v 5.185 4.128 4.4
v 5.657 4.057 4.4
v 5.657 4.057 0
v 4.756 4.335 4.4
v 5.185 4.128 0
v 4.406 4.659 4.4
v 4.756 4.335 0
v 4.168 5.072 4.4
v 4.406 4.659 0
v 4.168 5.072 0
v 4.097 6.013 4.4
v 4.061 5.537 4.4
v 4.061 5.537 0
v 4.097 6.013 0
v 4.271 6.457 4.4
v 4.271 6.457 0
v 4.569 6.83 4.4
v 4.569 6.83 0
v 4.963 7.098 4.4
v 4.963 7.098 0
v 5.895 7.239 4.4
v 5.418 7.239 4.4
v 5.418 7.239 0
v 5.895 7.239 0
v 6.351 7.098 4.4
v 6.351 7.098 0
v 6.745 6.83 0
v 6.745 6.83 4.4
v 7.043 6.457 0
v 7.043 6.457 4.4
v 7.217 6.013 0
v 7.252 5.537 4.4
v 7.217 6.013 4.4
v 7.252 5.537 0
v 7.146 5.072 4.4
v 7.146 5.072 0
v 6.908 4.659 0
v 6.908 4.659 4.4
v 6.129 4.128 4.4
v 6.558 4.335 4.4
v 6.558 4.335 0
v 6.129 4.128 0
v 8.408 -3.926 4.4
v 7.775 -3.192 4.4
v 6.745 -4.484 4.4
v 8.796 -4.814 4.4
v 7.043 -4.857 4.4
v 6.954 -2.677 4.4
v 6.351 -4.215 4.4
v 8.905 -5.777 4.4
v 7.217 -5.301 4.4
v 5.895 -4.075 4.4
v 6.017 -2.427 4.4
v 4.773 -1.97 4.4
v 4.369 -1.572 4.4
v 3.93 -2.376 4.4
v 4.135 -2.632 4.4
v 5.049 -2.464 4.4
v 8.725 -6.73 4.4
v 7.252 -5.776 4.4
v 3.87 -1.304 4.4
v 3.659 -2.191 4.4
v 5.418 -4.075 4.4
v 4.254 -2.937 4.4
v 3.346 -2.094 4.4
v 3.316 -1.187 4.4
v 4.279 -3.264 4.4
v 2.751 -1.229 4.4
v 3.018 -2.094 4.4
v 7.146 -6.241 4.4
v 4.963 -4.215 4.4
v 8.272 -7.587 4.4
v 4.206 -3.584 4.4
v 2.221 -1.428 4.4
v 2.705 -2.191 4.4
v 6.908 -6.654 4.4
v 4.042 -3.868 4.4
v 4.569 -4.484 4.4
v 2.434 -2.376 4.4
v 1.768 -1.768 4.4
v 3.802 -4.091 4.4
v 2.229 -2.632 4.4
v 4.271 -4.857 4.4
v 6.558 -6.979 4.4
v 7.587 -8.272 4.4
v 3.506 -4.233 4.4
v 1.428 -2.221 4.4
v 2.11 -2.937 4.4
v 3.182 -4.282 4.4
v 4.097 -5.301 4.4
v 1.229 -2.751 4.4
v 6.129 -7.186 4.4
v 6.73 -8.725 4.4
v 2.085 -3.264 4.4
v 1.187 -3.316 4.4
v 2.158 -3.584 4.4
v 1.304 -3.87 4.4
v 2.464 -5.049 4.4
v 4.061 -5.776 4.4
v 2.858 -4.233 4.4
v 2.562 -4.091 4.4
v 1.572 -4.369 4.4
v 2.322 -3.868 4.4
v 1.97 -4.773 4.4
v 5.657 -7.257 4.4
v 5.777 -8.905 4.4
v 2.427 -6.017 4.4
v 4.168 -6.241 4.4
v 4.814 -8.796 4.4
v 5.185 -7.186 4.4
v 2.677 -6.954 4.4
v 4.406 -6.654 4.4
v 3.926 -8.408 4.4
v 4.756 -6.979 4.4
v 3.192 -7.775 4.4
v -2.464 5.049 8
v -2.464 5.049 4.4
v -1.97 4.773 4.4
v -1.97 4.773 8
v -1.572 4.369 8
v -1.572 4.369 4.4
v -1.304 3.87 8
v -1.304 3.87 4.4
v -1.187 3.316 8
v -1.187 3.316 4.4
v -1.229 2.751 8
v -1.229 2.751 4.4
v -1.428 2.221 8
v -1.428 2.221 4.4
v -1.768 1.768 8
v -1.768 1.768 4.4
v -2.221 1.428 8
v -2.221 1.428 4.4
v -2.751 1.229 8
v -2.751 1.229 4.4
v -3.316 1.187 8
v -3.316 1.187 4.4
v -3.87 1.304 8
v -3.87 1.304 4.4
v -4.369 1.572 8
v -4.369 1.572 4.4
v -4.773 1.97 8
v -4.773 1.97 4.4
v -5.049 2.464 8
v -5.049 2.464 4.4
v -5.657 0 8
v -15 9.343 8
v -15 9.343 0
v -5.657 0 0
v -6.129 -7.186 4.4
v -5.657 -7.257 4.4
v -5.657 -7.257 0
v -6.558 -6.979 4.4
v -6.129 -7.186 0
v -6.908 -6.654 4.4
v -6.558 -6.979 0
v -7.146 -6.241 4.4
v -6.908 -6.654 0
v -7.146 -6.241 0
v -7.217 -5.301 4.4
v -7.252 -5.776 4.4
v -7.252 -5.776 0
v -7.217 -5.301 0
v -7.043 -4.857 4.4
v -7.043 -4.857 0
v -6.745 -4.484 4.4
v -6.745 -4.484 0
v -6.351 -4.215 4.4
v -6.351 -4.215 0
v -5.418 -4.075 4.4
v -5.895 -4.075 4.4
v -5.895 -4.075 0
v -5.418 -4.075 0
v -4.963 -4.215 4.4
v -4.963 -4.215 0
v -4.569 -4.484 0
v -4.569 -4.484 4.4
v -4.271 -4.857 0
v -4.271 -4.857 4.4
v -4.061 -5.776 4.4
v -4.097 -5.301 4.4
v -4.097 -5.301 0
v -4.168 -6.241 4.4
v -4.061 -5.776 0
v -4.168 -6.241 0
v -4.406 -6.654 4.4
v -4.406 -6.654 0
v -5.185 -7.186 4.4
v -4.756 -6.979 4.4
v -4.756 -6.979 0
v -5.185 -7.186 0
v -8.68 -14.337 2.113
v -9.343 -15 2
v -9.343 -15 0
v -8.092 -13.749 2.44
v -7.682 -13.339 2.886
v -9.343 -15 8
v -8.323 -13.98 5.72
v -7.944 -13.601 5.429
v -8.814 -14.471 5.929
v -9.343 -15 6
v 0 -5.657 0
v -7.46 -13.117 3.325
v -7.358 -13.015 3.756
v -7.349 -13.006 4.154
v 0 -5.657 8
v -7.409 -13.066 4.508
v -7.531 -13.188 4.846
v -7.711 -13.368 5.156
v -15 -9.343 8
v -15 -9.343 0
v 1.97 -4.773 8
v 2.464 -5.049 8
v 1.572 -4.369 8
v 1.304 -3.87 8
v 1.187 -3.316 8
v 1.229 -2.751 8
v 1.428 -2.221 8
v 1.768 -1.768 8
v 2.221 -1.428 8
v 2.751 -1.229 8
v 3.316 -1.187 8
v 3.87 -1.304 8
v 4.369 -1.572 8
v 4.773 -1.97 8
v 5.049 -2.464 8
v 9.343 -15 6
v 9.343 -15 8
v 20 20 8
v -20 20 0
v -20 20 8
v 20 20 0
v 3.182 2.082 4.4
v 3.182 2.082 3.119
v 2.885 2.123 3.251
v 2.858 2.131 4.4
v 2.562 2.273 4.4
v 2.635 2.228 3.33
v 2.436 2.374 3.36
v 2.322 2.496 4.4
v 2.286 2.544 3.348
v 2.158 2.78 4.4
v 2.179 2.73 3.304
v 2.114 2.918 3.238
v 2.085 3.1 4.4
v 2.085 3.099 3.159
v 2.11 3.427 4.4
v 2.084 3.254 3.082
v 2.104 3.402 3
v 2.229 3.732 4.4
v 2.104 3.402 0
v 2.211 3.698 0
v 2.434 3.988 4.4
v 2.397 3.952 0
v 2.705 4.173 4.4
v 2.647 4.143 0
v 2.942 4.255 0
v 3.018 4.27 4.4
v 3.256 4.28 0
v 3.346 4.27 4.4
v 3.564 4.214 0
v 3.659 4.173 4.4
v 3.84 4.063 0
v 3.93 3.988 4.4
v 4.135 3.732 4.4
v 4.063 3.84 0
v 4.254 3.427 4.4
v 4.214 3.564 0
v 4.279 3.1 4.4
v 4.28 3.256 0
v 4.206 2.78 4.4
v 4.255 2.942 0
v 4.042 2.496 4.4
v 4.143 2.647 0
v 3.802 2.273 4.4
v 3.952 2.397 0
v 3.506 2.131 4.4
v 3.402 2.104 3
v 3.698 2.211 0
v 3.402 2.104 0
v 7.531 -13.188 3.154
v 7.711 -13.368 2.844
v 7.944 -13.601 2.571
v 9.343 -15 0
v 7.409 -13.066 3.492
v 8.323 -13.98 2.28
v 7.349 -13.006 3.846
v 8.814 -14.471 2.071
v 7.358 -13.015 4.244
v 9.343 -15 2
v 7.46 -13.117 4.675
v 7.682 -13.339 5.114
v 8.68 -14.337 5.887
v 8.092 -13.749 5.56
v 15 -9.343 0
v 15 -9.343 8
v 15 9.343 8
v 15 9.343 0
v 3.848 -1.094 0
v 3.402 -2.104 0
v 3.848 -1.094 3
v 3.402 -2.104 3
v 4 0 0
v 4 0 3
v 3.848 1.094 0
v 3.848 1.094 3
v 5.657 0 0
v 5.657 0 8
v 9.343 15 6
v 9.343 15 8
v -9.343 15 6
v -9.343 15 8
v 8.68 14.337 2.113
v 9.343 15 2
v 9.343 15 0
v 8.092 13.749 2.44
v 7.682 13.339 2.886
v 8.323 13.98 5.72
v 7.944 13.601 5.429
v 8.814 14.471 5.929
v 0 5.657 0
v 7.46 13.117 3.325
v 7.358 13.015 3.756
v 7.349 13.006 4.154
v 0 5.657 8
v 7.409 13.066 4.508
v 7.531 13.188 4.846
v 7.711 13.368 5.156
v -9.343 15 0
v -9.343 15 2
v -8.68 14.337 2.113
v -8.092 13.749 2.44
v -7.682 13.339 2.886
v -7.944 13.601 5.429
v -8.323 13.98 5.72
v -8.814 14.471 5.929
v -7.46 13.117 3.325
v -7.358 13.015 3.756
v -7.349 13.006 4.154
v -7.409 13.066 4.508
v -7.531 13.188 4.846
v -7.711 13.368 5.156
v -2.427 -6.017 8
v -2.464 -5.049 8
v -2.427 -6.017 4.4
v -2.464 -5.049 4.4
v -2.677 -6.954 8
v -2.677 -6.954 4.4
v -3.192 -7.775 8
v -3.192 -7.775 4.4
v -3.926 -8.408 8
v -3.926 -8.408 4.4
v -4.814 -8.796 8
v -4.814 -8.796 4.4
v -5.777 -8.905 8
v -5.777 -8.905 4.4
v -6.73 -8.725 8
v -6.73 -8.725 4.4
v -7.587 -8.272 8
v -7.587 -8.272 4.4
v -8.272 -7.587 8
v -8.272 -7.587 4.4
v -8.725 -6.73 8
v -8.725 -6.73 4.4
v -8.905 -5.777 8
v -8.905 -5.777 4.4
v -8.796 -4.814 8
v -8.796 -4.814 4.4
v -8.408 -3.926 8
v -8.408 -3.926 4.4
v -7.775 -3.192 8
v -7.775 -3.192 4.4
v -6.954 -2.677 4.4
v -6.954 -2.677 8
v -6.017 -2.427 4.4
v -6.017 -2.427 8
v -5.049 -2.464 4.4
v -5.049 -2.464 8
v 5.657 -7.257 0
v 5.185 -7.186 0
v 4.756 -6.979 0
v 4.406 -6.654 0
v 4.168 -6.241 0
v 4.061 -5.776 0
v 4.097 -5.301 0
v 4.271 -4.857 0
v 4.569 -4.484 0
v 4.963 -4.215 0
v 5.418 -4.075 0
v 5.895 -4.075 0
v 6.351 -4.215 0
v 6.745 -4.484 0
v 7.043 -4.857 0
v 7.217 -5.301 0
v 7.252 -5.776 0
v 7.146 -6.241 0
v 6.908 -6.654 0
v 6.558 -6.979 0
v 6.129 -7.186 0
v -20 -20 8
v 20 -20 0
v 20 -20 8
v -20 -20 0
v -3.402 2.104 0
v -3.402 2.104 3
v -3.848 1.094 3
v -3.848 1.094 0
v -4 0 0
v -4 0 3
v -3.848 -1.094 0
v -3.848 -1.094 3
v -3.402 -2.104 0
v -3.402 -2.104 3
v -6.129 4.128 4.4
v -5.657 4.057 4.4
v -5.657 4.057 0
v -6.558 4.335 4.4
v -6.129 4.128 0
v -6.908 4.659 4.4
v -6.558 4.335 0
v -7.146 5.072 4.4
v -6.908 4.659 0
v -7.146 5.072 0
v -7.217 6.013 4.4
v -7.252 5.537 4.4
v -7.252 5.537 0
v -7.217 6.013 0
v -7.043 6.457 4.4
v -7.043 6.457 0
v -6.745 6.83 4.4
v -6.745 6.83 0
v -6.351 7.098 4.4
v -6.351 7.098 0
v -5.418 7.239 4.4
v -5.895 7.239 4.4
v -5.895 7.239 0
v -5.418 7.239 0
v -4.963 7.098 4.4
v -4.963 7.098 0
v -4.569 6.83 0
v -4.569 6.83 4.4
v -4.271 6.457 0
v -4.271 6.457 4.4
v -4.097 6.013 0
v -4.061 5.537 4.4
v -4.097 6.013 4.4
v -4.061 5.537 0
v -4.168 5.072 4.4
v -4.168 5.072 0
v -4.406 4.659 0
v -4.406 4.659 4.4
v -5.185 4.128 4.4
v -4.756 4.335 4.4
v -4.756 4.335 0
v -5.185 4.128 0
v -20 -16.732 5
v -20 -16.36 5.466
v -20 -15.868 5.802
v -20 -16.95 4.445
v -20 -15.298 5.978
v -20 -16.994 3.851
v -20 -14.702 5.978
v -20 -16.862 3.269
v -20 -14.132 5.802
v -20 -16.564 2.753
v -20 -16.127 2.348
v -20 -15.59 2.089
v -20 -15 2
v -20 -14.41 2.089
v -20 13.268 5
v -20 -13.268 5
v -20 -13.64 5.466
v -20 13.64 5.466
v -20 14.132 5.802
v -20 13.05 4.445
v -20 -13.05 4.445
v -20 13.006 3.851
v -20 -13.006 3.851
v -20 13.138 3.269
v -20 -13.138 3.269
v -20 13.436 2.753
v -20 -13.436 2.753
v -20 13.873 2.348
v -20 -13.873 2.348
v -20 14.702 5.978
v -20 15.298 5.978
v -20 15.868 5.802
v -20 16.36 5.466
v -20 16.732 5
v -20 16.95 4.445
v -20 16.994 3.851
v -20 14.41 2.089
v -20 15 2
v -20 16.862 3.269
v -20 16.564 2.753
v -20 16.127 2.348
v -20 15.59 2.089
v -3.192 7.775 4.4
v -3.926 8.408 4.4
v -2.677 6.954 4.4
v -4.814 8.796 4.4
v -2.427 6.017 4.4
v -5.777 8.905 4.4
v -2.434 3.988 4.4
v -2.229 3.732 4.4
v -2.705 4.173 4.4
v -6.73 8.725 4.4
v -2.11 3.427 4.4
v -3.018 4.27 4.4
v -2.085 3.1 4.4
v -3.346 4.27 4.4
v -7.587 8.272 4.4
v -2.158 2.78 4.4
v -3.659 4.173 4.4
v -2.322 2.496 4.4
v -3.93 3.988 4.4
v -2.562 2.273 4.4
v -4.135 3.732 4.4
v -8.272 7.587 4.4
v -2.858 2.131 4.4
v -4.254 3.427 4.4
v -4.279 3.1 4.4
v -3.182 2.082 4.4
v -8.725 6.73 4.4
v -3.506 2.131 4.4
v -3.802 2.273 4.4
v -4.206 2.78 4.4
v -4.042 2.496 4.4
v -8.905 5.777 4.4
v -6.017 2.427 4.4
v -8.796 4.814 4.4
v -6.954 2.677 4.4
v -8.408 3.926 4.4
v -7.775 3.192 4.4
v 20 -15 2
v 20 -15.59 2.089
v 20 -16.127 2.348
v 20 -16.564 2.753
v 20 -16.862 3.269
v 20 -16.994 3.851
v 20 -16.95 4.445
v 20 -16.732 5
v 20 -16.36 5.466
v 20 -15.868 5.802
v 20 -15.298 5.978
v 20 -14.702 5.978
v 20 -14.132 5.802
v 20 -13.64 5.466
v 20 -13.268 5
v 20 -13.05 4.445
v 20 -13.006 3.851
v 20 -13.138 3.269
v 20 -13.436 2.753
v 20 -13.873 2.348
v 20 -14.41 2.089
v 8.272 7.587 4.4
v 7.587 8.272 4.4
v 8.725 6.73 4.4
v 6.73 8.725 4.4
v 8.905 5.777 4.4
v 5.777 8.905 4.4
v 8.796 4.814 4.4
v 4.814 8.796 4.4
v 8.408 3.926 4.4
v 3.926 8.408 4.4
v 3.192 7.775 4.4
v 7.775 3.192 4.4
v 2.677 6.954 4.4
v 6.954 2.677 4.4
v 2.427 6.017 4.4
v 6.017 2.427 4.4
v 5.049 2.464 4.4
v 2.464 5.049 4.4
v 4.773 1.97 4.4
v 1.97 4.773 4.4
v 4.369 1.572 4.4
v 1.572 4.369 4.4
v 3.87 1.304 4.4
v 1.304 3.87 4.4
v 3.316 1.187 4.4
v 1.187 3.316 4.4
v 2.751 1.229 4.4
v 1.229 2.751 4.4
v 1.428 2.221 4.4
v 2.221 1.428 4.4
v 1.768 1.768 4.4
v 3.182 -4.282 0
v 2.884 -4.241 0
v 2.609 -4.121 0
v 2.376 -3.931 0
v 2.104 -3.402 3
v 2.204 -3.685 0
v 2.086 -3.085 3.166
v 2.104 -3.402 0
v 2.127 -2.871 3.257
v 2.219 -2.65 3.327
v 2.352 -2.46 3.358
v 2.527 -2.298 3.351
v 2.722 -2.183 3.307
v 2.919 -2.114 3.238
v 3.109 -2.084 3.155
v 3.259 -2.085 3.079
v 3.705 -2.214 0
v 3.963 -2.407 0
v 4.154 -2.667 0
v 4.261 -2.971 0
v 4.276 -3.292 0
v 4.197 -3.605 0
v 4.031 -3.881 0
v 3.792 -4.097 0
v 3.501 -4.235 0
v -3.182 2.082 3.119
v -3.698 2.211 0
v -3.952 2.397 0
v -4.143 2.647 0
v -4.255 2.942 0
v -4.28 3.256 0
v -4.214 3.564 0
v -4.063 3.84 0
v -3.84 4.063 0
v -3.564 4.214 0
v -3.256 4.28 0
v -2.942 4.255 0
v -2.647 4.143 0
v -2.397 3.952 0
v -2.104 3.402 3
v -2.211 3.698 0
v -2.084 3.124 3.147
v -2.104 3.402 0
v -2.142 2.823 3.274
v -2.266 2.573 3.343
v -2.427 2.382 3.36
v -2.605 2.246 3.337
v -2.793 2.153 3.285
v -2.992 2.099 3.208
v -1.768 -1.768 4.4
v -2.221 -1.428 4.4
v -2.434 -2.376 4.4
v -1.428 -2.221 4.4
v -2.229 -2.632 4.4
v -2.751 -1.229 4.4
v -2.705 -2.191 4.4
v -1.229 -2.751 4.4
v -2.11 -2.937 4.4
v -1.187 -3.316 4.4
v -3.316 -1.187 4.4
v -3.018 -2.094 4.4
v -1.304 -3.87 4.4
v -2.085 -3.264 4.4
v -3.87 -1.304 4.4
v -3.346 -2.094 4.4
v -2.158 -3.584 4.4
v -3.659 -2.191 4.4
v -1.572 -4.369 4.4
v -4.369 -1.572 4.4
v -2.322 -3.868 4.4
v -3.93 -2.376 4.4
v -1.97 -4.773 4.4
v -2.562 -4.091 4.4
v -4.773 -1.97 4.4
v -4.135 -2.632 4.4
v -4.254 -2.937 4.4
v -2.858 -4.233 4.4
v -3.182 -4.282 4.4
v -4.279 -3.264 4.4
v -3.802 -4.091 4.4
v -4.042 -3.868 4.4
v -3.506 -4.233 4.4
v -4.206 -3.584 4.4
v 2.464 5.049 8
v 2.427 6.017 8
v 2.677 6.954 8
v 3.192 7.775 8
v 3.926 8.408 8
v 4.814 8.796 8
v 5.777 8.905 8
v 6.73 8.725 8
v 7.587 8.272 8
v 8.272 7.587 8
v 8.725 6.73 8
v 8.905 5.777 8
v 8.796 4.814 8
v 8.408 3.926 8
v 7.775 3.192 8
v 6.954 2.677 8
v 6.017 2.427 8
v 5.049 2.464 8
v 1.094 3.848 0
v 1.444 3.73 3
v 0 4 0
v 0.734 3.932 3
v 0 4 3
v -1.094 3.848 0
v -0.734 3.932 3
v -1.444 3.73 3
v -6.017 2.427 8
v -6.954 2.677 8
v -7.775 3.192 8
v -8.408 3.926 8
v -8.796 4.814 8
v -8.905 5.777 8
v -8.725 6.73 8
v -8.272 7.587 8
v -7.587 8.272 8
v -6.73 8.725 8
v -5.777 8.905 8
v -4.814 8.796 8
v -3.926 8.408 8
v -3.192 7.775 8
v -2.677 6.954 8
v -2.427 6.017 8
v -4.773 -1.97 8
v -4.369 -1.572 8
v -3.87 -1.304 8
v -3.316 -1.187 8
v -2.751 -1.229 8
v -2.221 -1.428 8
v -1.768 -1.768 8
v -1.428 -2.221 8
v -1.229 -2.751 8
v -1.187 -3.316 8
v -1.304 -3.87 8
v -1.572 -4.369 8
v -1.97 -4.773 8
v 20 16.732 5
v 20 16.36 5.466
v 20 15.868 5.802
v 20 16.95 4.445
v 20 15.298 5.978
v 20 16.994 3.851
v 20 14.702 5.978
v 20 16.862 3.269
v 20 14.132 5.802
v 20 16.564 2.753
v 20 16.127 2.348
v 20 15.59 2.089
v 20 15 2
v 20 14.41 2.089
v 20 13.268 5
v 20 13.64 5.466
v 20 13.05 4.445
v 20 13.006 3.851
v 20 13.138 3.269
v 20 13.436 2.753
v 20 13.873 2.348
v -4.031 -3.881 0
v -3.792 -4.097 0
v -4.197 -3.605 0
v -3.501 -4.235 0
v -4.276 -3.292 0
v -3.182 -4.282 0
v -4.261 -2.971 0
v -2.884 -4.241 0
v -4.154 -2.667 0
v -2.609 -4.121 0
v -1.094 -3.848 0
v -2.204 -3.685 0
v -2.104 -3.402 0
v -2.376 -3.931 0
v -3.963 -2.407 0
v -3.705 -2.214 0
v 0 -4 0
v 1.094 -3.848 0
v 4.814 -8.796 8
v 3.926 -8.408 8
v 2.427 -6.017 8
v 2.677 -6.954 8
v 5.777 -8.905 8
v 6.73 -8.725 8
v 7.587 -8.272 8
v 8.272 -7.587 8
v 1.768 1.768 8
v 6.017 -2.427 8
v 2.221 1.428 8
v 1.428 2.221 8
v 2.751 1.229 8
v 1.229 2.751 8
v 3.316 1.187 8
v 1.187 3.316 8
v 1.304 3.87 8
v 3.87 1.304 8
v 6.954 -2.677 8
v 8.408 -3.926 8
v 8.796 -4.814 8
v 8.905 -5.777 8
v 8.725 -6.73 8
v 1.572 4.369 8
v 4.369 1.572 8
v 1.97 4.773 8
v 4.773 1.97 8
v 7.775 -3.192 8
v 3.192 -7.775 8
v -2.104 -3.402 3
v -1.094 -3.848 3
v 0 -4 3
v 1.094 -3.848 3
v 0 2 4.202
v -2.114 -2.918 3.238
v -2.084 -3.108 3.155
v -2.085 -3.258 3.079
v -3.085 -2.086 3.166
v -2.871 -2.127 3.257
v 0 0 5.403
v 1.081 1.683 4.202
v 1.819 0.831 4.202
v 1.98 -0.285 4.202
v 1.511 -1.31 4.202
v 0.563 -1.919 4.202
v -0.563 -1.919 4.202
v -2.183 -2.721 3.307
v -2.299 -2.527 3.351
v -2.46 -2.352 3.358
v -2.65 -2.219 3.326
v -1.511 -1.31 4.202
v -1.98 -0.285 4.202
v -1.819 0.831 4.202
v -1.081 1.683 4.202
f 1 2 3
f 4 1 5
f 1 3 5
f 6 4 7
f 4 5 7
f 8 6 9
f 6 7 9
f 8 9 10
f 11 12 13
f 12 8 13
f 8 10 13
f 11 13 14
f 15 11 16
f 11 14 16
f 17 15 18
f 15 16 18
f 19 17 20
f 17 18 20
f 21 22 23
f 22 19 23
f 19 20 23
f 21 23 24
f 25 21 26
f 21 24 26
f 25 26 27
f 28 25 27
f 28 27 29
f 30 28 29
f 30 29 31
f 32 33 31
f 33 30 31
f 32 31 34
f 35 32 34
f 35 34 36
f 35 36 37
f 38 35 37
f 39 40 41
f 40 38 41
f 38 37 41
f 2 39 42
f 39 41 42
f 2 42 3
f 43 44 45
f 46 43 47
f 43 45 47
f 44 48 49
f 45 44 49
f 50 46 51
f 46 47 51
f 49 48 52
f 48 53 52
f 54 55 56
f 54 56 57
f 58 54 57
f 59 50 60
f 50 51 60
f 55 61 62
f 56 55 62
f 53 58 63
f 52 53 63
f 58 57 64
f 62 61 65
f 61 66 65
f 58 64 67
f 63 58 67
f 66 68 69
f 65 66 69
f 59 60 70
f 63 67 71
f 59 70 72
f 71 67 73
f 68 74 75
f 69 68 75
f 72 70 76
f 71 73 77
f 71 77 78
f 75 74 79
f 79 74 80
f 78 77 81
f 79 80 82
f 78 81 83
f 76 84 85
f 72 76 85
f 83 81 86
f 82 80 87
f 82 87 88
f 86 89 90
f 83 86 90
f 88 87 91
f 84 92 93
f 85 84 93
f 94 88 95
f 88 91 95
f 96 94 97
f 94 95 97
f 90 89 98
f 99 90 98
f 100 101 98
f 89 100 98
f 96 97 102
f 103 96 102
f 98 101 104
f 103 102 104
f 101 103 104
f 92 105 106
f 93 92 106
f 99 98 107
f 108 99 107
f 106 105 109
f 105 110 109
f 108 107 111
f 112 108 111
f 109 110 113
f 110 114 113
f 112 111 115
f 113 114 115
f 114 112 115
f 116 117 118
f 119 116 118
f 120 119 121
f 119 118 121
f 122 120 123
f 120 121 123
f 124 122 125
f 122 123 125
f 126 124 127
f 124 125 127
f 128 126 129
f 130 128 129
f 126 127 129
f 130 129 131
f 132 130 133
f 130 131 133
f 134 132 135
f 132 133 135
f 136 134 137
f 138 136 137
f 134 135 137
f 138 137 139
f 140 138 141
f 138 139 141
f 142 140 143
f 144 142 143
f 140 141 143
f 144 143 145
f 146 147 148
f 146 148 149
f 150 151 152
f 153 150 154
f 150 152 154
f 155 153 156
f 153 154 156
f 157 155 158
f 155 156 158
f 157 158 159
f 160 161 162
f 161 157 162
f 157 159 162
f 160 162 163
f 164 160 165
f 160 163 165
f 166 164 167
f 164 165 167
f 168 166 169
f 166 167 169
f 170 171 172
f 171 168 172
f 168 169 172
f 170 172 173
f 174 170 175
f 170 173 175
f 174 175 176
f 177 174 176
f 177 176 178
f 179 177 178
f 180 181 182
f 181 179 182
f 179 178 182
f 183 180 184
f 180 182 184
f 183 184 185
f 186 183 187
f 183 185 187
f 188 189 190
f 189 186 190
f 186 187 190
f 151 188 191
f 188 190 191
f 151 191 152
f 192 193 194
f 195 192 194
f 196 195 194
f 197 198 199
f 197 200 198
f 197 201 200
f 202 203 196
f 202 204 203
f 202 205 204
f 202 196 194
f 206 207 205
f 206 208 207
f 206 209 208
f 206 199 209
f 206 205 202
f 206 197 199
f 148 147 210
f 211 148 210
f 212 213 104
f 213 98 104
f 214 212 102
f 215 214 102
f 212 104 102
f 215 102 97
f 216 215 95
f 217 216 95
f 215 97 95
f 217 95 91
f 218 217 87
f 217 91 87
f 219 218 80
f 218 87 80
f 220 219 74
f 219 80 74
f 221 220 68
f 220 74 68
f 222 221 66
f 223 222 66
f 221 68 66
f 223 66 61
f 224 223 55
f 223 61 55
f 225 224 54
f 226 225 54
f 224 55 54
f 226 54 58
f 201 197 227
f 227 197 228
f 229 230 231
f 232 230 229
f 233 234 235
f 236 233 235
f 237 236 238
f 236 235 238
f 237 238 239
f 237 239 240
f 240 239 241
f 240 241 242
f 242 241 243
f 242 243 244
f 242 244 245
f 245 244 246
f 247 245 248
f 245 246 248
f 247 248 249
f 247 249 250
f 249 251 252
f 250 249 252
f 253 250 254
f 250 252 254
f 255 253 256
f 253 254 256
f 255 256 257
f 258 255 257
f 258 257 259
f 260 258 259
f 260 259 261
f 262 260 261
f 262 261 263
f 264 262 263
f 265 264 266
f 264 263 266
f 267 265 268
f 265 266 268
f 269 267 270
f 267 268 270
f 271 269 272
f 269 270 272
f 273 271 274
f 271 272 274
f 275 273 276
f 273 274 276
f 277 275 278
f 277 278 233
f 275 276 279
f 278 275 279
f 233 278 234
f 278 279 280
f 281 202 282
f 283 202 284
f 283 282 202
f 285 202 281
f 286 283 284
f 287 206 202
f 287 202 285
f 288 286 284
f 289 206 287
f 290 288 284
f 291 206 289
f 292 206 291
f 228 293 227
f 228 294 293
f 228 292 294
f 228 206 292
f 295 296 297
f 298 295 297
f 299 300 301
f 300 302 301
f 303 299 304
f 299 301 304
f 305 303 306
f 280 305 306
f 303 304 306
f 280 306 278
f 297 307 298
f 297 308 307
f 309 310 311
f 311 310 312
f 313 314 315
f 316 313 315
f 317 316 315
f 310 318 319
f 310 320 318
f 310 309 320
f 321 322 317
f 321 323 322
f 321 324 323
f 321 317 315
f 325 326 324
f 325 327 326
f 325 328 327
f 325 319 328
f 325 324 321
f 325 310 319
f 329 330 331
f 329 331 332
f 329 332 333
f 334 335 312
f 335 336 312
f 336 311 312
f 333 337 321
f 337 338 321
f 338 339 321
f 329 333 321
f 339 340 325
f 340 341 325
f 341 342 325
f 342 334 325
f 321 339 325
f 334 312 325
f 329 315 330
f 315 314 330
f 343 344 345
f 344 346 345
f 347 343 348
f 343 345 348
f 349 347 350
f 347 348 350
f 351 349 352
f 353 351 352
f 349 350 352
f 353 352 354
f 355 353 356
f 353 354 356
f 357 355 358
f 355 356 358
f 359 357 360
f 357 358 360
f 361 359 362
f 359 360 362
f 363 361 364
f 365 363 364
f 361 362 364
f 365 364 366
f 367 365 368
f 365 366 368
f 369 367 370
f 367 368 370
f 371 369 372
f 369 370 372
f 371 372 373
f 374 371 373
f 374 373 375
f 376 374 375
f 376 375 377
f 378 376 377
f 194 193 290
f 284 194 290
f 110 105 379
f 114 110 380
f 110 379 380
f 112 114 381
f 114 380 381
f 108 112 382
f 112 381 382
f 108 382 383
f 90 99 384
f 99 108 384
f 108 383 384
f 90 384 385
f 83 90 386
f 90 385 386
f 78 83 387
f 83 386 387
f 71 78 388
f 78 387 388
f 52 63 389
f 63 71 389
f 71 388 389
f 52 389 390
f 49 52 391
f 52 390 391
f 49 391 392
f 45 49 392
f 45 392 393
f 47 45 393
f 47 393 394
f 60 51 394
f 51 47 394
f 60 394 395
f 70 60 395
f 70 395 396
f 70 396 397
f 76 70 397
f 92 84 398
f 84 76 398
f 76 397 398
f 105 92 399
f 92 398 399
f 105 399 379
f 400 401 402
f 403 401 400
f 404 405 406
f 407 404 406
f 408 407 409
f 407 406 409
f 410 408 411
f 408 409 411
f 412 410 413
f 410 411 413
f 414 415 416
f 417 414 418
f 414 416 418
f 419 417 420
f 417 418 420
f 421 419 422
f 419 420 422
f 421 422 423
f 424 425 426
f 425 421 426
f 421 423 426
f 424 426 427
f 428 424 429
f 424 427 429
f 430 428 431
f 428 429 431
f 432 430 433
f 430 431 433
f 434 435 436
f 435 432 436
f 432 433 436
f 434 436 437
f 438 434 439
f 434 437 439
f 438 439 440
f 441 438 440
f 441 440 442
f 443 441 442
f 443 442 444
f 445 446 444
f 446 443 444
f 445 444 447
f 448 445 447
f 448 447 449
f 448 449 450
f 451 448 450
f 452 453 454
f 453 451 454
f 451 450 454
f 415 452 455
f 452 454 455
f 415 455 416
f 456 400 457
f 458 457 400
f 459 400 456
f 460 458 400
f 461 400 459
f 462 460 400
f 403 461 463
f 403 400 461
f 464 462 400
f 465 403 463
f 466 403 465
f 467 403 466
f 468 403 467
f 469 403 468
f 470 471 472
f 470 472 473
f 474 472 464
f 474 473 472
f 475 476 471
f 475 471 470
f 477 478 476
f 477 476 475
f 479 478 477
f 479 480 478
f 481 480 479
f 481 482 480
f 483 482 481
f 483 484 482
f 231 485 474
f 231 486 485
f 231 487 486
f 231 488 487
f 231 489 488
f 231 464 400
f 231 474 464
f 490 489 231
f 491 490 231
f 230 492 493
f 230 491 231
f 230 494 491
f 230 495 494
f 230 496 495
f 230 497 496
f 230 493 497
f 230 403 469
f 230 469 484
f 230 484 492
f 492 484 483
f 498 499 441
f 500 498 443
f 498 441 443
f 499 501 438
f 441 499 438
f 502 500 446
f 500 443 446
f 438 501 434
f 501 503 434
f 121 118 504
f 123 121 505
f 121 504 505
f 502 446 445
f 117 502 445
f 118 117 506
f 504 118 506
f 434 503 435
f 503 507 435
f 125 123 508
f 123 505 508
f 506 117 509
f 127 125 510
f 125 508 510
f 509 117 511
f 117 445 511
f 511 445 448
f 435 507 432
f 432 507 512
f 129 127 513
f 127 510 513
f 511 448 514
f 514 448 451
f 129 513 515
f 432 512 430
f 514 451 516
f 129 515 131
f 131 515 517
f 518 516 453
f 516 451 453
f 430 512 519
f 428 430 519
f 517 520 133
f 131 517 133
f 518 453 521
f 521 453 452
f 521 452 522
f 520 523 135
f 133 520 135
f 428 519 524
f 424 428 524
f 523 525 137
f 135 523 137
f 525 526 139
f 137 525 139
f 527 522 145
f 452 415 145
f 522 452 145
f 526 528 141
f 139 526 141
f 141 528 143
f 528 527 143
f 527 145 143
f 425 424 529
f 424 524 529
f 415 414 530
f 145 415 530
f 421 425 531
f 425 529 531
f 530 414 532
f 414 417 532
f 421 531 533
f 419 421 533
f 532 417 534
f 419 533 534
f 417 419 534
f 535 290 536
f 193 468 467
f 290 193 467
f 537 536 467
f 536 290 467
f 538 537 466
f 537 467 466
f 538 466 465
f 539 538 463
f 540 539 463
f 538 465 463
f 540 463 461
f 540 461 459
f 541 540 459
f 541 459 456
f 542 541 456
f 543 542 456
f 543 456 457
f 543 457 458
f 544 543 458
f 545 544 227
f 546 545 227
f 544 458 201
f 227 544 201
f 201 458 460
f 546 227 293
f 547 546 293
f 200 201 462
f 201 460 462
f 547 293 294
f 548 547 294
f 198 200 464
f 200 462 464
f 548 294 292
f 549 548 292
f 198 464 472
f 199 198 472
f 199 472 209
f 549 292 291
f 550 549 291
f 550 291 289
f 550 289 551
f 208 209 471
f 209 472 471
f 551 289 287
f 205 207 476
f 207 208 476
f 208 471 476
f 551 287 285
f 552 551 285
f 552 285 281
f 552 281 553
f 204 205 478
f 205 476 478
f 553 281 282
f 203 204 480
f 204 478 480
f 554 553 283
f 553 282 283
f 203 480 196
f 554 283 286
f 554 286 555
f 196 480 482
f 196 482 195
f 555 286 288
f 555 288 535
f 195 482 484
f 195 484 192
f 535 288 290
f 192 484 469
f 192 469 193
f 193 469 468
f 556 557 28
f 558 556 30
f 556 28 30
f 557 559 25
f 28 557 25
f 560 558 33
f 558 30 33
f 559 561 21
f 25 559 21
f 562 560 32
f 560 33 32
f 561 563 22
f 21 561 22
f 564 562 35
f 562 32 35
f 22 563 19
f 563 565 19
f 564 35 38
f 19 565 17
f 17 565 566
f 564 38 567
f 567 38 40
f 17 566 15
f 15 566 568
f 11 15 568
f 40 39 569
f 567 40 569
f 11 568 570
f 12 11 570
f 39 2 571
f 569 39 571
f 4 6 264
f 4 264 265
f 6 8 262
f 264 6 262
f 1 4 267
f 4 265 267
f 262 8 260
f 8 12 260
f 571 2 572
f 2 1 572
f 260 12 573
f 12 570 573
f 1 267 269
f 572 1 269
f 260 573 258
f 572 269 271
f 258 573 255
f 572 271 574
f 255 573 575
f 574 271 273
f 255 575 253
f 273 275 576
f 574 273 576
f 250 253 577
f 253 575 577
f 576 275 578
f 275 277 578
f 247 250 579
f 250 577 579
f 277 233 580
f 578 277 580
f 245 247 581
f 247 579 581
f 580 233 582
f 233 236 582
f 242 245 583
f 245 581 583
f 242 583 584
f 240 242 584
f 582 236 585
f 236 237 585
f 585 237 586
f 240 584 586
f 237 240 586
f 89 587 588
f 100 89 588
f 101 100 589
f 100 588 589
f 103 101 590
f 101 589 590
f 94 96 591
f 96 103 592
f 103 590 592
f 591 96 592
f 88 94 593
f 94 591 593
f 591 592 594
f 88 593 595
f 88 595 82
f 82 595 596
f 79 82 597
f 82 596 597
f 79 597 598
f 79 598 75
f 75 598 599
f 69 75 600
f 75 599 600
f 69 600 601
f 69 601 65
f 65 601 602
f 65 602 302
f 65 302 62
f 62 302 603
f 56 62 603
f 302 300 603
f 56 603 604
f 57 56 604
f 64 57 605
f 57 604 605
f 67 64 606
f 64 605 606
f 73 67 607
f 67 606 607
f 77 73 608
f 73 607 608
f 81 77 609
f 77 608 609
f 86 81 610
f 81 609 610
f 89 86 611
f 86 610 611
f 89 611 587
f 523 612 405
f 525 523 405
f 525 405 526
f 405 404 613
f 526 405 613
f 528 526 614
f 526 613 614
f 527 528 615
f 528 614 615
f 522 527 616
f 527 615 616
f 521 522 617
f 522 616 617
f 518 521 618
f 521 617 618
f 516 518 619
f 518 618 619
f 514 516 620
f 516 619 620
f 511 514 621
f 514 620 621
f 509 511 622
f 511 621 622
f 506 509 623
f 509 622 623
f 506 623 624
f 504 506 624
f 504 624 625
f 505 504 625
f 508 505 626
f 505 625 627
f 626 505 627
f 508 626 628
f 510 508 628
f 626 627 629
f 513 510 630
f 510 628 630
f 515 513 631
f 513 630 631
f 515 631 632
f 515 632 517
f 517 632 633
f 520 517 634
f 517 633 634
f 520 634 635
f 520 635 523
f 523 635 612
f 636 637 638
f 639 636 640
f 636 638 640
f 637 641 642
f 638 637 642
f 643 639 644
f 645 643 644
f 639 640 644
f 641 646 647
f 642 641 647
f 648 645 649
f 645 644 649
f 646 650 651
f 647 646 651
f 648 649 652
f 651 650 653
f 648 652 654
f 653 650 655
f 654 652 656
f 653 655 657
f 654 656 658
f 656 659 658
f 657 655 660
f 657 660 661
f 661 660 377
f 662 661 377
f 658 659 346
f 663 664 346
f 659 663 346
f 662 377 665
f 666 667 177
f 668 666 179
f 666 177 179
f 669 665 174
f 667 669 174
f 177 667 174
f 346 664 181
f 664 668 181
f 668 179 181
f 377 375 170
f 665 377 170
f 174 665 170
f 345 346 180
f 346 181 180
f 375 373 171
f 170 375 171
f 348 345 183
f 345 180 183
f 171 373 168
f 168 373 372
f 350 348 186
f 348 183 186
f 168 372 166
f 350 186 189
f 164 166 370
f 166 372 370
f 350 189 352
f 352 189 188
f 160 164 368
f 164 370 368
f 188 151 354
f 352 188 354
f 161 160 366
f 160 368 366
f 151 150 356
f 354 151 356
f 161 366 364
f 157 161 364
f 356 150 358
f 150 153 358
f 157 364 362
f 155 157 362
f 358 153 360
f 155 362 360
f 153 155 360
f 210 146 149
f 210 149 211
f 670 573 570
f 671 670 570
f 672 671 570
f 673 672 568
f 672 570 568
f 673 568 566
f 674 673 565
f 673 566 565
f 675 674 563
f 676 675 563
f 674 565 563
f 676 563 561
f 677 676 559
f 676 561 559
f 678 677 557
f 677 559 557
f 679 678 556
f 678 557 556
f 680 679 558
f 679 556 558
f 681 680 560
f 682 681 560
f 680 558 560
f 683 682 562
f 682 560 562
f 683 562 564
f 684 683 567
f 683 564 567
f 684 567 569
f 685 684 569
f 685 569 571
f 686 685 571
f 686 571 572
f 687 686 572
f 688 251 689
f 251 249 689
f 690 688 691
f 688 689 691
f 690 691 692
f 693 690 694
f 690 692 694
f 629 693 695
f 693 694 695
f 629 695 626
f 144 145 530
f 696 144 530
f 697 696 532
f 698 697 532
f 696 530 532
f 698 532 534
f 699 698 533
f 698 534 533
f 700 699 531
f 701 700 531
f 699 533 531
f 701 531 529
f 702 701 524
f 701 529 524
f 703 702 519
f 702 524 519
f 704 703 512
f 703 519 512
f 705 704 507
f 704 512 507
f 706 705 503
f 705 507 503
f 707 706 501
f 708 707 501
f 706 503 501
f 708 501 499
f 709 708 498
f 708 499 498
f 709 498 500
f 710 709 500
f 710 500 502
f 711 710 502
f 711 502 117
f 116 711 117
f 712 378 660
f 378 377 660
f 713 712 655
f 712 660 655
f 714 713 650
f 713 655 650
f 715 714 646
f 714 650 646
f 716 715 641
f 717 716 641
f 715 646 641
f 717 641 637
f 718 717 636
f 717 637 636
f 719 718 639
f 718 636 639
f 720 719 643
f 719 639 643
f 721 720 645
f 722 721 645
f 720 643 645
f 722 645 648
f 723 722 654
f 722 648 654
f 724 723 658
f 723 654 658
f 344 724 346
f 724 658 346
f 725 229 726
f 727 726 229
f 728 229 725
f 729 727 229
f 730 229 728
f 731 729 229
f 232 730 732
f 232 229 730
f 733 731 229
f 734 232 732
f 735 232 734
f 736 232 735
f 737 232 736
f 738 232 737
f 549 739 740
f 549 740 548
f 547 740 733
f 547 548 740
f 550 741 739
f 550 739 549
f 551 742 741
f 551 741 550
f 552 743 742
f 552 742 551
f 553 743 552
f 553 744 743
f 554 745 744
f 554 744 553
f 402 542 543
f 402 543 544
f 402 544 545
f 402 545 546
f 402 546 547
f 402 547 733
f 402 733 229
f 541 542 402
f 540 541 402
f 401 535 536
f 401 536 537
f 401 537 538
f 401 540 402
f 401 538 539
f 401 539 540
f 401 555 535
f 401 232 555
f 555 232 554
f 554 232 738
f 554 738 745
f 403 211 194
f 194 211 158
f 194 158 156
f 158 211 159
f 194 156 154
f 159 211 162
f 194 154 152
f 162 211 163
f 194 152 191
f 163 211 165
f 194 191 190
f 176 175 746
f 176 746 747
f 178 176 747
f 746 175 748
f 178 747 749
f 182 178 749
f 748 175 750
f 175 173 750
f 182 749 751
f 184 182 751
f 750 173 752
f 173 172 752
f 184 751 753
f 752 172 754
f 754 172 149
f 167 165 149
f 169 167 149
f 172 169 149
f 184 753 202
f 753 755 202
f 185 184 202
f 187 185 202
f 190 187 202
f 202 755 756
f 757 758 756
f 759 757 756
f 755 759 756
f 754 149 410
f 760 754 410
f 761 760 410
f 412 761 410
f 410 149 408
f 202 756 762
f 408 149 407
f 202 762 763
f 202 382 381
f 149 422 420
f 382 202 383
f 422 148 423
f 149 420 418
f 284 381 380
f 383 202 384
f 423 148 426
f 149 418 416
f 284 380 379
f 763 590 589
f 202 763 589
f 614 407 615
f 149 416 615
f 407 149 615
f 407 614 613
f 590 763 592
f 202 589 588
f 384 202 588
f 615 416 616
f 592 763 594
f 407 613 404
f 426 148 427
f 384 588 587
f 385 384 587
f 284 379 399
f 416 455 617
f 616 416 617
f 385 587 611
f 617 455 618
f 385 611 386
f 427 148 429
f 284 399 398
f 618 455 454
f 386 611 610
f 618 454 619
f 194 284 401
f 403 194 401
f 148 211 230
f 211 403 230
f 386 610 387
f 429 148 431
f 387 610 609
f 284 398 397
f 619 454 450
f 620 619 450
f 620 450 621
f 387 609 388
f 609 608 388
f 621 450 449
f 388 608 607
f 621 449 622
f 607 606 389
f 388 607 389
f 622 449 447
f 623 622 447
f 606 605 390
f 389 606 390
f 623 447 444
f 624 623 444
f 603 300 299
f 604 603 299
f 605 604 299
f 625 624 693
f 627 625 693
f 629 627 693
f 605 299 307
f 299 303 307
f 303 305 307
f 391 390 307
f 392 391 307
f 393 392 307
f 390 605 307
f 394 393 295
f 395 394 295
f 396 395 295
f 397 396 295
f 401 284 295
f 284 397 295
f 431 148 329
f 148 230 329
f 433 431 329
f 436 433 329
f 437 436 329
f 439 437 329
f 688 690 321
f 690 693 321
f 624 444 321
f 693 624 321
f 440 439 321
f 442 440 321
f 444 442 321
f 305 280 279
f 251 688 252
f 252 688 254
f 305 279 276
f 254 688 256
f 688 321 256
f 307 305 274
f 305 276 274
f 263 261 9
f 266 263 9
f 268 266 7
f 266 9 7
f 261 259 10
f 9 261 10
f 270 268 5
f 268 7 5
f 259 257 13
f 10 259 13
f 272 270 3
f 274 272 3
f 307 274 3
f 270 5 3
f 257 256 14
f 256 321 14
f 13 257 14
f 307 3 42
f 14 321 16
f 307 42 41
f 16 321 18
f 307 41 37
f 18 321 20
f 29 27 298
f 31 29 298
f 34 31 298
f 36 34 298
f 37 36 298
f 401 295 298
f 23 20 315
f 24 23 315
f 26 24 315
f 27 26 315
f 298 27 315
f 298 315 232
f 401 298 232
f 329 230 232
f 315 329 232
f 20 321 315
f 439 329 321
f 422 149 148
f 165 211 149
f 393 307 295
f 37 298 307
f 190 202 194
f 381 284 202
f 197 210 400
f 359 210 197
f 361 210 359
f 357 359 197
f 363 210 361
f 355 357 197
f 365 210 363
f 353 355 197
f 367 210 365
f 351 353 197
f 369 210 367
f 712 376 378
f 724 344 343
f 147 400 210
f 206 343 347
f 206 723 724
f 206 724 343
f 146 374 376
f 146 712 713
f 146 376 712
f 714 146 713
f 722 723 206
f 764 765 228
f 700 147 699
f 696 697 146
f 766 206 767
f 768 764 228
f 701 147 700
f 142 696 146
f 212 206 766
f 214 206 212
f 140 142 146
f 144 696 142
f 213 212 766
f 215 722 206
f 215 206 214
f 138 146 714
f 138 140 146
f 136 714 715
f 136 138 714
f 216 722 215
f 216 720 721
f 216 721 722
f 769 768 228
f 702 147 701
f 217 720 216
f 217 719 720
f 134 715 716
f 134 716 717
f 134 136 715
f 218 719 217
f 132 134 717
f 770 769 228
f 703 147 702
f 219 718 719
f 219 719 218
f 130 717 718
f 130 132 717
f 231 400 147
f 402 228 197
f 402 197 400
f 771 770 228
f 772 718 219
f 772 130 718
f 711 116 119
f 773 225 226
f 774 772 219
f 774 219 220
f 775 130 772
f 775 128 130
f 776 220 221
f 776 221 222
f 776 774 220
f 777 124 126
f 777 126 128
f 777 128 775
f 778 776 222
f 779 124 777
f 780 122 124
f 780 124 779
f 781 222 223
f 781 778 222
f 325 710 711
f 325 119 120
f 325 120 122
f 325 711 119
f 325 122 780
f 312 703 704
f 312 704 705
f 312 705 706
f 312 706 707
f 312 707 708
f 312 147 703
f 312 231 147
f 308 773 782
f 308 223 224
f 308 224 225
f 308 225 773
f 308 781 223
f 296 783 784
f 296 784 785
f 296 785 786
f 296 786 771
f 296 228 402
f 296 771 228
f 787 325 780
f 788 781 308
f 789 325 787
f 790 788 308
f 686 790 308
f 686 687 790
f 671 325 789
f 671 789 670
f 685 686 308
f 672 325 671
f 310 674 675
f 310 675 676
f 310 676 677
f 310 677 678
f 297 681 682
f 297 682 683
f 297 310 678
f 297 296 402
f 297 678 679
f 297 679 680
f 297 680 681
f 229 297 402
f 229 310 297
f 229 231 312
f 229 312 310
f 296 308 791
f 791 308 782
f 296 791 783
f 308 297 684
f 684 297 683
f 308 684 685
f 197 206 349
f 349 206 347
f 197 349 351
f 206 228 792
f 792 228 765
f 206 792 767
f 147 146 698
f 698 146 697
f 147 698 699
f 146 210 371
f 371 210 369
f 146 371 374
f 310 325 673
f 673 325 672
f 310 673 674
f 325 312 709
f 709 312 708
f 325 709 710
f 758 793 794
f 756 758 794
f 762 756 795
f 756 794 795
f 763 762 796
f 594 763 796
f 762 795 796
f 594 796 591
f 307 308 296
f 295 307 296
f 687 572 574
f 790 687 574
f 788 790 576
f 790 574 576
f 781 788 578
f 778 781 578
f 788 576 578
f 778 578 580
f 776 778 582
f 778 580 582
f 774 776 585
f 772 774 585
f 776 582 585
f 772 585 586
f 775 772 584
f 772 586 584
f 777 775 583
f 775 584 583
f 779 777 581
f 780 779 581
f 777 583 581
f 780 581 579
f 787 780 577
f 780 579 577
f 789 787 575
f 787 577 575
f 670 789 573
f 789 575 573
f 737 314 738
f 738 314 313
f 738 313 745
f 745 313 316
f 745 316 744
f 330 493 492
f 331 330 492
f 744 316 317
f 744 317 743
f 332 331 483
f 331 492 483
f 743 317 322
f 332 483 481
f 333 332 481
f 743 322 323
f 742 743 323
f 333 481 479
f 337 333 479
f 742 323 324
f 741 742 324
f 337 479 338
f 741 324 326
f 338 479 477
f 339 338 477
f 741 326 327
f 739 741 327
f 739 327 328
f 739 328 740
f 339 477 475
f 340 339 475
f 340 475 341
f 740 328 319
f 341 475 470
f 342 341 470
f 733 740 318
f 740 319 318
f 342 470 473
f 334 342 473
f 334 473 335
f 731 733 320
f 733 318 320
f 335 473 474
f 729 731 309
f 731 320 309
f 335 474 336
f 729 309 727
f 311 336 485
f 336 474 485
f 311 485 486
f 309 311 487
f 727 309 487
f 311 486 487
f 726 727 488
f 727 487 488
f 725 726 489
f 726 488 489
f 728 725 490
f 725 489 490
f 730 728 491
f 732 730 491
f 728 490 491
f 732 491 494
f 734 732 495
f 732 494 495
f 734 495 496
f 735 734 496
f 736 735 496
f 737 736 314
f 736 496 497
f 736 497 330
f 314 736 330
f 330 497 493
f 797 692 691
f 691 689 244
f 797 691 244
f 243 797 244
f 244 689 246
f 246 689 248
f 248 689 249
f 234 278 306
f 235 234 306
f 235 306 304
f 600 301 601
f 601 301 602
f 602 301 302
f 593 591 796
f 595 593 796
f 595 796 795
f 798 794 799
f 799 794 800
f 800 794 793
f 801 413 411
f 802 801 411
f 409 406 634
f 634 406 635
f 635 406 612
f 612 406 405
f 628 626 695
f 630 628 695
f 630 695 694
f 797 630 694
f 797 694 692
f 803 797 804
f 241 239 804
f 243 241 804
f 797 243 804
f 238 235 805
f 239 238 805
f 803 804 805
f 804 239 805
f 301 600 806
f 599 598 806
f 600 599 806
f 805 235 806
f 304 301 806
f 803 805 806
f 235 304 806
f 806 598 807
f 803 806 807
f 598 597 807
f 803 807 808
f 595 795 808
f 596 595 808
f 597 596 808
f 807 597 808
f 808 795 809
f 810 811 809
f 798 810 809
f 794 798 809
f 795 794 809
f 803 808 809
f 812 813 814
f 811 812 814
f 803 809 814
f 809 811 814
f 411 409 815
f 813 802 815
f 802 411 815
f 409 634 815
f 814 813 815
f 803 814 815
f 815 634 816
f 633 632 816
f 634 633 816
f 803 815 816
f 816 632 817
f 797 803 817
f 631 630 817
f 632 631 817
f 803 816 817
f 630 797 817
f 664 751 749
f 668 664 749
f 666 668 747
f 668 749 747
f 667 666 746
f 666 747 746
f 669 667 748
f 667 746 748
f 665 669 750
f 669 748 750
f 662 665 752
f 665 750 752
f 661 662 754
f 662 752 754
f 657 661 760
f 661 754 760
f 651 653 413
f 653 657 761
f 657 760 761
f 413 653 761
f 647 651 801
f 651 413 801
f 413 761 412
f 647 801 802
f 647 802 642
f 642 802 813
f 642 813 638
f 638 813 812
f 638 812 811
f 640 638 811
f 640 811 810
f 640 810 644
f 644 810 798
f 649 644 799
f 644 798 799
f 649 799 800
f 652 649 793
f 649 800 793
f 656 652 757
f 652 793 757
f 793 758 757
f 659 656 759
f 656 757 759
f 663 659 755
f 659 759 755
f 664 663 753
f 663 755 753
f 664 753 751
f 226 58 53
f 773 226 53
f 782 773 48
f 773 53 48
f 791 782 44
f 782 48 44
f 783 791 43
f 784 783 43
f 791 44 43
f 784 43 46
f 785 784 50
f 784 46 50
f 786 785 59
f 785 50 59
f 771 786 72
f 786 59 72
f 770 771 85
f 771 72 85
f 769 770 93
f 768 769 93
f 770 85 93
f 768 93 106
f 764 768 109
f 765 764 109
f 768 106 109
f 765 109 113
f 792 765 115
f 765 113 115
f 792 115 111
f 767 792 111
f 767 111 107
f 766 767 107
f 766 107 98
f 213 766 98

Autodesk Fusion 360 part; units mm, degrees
sketch "Sketch1" plane through (0, 0, 0) normal (0, 0, 1) x (1, 0, 0)
  line L0 (20, -20) -> (-20, -20)
  line L1 (-20, -20) -> (-20, 20)
  line L2 (-20, 20) -> (20, 20)
  line L3 (20, 20) -> (20, -20)
  line L4 (20, -20) -> (-20, 20) construction
  line L5 (-20, -20) -> (20, 20) construction
  dimension "d1" = 40
  dimension "d2" = 40
extrude "Extrude1" add sketch "Sketch1" along normal blind 8
sketch "Sketch2" plane through (20, 0, 0) normal (1, 0, 0) x (0, 1, 0)
  line L0 (-20, 0) -> (20, 0)
  line L1 (20, 0) -> (20, 8)
  line L2 (20, 8) -> (-20, 8)
  line L3 (-20, 8) -> (-20, 0)
  line L4 (-20, 4) -> (20, 4) construction
  line L5 (0, 8) -> (0, 0) construction
  point P0 (-15, 4)
  point P1 (15, 4)
  point P2 (-20, 4)
  point P3 (20, 4)
  dimension "d5" = 30
sketch "Sketch3" plane through (0, 0, 8) normal (0, 0, 1) x (-1, 0, 0)
  line L0 (-20, -20) -> (20, -20)
  line L1 (20, -20) -> (20, 20)
  line L2 (20, 20) -> (-20, 20)
  line L3 (-20, 20) -> (-20, -20)
  line L4 (-20, -20) -> (-20, 20)
  line L5 (-20, 20) -> (20, 20)
  line L6 (20, -20) -> (-20, -20)
  line L7 (20, 20) -> (20, -20)
  line L8 (-15, 15) -> (-15, -15)
  line L9 (-15, -15) -> (15, -15)
  line L10 (15, -15) -> (15, 15)
  line L11 (15, 15) -> (-15, 15)
  line L12 (15, 15) -> (-15, -15) construction
  line L13 (-15, 15) -> (15, -15) construction
  line L14 (9.3431, -15) -> (-15, 9.3431)
  line L15 (15, -9.3431) -> (-9.3431, 15)
  line L16 (9.3431, 15) -> (-15, -9.3431)
  line L17 (-9.3431, -15) -> (15, 9.3431)
  point P0 (5.6569, -5.6569)
  point P1 (-5.6569, 5.6569)
  point P2 (-5.6569, -5.6569)
  point P3 (5.6569, 5.6569)
  point P4 (3.182, 3.182)
  point P5 (-3.182, 3.182)
  point P6 (-3.182, -3.182)
  point P7 (3.182, -3.182)
  dimension "d24" = -5
  dimension "d25" = 8
  dimension "d26" = 8
  dimension "d49" = 16
  dimension "d50" = 9
extrude "Extrude3" cut sketch "Sketch3" against normal up to surface (8 mm away) contours L8 L14 L16 | L11 L15 L16 | L9 L14 L17 | L10 L15 L17
hole "Hole2" at (20, -15, 4) at (20, 15, 4) direction (-1, 0, 0) diameter 4 end up to surface (40 mm away)
hole "Hole3" at (-5.6569, 5.6569, 8) at (5.6569, 5.6569, 8) at (5.6569, -5.6569, 8) at (-5.6569, -5.6569, 8) direction (0, 0, -1) diameter 3.2 end up to surface (8 mm away) counterbore diameter 6.5 counterbore depth 3.6
hole "Hole4" at (-3.182, 3.182, 8) at (3.182, 3.182, 8) at (3.182, -3.182, 8) at (-3.182, -3.182, 8) direction (0, 0, -1) diameter 2.2 end up to surface (8 mm away) counterbore diameter 4 counterbore depth 3.6
sketch "Sketch5" plane through (0, 0, 0) normal (0, 0, 1) x (1, 0, 0)
hole "Hole6" at (0, 0, 0) direction (0, 0, 1) diameter 8 depth 3 tip angle 118
equation "d26 = d25"
